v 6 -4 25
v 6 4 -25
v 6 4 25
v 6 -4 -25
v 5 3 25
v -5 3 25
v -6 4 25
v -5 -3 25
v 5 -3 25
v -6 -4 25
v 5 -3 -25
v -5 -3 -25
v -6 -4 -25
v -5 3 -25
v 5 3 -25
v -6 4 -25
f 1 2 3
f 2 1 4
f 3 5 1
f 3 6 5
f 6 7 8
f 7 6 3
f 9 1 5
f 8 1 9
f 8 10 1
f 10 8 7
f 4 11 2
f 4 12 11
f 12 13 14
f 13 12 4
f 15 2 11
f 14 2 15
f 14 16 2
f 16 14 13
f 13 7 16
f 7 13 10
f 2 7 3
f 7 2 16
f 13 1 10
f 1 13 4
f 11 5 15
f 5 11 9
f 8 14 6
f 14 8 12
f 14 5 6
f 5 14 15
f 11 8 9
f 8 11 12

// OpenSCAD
$fn = 64;

// Aluminium rectangular box section: 12mm x 8mm x 1mm wall
outer_w = 12;   // X (mm)
outer_h = 8;    // Y (mm)
wall    = 1;    // (mm)
length  = 50;   // Z (mm)

inner_w = outer_w - 2*wall;
inner_h = outer_h - 2*wall;

assert(inner_w > 0 && inner_h > 0, "Wall thickness too large for given outer dimensions.");

eps = 0.02; // small overlap to ensure clean boolean

difference() {
    // Centered outer solid for robust viewing/orientation
    cube([outer_w, outer_h, length], center=true);

    // Inner void: same center, slightly longer to guarantee through-cut
    cube([inner_w, inner_h, length + 2*eps], center=true);
}
